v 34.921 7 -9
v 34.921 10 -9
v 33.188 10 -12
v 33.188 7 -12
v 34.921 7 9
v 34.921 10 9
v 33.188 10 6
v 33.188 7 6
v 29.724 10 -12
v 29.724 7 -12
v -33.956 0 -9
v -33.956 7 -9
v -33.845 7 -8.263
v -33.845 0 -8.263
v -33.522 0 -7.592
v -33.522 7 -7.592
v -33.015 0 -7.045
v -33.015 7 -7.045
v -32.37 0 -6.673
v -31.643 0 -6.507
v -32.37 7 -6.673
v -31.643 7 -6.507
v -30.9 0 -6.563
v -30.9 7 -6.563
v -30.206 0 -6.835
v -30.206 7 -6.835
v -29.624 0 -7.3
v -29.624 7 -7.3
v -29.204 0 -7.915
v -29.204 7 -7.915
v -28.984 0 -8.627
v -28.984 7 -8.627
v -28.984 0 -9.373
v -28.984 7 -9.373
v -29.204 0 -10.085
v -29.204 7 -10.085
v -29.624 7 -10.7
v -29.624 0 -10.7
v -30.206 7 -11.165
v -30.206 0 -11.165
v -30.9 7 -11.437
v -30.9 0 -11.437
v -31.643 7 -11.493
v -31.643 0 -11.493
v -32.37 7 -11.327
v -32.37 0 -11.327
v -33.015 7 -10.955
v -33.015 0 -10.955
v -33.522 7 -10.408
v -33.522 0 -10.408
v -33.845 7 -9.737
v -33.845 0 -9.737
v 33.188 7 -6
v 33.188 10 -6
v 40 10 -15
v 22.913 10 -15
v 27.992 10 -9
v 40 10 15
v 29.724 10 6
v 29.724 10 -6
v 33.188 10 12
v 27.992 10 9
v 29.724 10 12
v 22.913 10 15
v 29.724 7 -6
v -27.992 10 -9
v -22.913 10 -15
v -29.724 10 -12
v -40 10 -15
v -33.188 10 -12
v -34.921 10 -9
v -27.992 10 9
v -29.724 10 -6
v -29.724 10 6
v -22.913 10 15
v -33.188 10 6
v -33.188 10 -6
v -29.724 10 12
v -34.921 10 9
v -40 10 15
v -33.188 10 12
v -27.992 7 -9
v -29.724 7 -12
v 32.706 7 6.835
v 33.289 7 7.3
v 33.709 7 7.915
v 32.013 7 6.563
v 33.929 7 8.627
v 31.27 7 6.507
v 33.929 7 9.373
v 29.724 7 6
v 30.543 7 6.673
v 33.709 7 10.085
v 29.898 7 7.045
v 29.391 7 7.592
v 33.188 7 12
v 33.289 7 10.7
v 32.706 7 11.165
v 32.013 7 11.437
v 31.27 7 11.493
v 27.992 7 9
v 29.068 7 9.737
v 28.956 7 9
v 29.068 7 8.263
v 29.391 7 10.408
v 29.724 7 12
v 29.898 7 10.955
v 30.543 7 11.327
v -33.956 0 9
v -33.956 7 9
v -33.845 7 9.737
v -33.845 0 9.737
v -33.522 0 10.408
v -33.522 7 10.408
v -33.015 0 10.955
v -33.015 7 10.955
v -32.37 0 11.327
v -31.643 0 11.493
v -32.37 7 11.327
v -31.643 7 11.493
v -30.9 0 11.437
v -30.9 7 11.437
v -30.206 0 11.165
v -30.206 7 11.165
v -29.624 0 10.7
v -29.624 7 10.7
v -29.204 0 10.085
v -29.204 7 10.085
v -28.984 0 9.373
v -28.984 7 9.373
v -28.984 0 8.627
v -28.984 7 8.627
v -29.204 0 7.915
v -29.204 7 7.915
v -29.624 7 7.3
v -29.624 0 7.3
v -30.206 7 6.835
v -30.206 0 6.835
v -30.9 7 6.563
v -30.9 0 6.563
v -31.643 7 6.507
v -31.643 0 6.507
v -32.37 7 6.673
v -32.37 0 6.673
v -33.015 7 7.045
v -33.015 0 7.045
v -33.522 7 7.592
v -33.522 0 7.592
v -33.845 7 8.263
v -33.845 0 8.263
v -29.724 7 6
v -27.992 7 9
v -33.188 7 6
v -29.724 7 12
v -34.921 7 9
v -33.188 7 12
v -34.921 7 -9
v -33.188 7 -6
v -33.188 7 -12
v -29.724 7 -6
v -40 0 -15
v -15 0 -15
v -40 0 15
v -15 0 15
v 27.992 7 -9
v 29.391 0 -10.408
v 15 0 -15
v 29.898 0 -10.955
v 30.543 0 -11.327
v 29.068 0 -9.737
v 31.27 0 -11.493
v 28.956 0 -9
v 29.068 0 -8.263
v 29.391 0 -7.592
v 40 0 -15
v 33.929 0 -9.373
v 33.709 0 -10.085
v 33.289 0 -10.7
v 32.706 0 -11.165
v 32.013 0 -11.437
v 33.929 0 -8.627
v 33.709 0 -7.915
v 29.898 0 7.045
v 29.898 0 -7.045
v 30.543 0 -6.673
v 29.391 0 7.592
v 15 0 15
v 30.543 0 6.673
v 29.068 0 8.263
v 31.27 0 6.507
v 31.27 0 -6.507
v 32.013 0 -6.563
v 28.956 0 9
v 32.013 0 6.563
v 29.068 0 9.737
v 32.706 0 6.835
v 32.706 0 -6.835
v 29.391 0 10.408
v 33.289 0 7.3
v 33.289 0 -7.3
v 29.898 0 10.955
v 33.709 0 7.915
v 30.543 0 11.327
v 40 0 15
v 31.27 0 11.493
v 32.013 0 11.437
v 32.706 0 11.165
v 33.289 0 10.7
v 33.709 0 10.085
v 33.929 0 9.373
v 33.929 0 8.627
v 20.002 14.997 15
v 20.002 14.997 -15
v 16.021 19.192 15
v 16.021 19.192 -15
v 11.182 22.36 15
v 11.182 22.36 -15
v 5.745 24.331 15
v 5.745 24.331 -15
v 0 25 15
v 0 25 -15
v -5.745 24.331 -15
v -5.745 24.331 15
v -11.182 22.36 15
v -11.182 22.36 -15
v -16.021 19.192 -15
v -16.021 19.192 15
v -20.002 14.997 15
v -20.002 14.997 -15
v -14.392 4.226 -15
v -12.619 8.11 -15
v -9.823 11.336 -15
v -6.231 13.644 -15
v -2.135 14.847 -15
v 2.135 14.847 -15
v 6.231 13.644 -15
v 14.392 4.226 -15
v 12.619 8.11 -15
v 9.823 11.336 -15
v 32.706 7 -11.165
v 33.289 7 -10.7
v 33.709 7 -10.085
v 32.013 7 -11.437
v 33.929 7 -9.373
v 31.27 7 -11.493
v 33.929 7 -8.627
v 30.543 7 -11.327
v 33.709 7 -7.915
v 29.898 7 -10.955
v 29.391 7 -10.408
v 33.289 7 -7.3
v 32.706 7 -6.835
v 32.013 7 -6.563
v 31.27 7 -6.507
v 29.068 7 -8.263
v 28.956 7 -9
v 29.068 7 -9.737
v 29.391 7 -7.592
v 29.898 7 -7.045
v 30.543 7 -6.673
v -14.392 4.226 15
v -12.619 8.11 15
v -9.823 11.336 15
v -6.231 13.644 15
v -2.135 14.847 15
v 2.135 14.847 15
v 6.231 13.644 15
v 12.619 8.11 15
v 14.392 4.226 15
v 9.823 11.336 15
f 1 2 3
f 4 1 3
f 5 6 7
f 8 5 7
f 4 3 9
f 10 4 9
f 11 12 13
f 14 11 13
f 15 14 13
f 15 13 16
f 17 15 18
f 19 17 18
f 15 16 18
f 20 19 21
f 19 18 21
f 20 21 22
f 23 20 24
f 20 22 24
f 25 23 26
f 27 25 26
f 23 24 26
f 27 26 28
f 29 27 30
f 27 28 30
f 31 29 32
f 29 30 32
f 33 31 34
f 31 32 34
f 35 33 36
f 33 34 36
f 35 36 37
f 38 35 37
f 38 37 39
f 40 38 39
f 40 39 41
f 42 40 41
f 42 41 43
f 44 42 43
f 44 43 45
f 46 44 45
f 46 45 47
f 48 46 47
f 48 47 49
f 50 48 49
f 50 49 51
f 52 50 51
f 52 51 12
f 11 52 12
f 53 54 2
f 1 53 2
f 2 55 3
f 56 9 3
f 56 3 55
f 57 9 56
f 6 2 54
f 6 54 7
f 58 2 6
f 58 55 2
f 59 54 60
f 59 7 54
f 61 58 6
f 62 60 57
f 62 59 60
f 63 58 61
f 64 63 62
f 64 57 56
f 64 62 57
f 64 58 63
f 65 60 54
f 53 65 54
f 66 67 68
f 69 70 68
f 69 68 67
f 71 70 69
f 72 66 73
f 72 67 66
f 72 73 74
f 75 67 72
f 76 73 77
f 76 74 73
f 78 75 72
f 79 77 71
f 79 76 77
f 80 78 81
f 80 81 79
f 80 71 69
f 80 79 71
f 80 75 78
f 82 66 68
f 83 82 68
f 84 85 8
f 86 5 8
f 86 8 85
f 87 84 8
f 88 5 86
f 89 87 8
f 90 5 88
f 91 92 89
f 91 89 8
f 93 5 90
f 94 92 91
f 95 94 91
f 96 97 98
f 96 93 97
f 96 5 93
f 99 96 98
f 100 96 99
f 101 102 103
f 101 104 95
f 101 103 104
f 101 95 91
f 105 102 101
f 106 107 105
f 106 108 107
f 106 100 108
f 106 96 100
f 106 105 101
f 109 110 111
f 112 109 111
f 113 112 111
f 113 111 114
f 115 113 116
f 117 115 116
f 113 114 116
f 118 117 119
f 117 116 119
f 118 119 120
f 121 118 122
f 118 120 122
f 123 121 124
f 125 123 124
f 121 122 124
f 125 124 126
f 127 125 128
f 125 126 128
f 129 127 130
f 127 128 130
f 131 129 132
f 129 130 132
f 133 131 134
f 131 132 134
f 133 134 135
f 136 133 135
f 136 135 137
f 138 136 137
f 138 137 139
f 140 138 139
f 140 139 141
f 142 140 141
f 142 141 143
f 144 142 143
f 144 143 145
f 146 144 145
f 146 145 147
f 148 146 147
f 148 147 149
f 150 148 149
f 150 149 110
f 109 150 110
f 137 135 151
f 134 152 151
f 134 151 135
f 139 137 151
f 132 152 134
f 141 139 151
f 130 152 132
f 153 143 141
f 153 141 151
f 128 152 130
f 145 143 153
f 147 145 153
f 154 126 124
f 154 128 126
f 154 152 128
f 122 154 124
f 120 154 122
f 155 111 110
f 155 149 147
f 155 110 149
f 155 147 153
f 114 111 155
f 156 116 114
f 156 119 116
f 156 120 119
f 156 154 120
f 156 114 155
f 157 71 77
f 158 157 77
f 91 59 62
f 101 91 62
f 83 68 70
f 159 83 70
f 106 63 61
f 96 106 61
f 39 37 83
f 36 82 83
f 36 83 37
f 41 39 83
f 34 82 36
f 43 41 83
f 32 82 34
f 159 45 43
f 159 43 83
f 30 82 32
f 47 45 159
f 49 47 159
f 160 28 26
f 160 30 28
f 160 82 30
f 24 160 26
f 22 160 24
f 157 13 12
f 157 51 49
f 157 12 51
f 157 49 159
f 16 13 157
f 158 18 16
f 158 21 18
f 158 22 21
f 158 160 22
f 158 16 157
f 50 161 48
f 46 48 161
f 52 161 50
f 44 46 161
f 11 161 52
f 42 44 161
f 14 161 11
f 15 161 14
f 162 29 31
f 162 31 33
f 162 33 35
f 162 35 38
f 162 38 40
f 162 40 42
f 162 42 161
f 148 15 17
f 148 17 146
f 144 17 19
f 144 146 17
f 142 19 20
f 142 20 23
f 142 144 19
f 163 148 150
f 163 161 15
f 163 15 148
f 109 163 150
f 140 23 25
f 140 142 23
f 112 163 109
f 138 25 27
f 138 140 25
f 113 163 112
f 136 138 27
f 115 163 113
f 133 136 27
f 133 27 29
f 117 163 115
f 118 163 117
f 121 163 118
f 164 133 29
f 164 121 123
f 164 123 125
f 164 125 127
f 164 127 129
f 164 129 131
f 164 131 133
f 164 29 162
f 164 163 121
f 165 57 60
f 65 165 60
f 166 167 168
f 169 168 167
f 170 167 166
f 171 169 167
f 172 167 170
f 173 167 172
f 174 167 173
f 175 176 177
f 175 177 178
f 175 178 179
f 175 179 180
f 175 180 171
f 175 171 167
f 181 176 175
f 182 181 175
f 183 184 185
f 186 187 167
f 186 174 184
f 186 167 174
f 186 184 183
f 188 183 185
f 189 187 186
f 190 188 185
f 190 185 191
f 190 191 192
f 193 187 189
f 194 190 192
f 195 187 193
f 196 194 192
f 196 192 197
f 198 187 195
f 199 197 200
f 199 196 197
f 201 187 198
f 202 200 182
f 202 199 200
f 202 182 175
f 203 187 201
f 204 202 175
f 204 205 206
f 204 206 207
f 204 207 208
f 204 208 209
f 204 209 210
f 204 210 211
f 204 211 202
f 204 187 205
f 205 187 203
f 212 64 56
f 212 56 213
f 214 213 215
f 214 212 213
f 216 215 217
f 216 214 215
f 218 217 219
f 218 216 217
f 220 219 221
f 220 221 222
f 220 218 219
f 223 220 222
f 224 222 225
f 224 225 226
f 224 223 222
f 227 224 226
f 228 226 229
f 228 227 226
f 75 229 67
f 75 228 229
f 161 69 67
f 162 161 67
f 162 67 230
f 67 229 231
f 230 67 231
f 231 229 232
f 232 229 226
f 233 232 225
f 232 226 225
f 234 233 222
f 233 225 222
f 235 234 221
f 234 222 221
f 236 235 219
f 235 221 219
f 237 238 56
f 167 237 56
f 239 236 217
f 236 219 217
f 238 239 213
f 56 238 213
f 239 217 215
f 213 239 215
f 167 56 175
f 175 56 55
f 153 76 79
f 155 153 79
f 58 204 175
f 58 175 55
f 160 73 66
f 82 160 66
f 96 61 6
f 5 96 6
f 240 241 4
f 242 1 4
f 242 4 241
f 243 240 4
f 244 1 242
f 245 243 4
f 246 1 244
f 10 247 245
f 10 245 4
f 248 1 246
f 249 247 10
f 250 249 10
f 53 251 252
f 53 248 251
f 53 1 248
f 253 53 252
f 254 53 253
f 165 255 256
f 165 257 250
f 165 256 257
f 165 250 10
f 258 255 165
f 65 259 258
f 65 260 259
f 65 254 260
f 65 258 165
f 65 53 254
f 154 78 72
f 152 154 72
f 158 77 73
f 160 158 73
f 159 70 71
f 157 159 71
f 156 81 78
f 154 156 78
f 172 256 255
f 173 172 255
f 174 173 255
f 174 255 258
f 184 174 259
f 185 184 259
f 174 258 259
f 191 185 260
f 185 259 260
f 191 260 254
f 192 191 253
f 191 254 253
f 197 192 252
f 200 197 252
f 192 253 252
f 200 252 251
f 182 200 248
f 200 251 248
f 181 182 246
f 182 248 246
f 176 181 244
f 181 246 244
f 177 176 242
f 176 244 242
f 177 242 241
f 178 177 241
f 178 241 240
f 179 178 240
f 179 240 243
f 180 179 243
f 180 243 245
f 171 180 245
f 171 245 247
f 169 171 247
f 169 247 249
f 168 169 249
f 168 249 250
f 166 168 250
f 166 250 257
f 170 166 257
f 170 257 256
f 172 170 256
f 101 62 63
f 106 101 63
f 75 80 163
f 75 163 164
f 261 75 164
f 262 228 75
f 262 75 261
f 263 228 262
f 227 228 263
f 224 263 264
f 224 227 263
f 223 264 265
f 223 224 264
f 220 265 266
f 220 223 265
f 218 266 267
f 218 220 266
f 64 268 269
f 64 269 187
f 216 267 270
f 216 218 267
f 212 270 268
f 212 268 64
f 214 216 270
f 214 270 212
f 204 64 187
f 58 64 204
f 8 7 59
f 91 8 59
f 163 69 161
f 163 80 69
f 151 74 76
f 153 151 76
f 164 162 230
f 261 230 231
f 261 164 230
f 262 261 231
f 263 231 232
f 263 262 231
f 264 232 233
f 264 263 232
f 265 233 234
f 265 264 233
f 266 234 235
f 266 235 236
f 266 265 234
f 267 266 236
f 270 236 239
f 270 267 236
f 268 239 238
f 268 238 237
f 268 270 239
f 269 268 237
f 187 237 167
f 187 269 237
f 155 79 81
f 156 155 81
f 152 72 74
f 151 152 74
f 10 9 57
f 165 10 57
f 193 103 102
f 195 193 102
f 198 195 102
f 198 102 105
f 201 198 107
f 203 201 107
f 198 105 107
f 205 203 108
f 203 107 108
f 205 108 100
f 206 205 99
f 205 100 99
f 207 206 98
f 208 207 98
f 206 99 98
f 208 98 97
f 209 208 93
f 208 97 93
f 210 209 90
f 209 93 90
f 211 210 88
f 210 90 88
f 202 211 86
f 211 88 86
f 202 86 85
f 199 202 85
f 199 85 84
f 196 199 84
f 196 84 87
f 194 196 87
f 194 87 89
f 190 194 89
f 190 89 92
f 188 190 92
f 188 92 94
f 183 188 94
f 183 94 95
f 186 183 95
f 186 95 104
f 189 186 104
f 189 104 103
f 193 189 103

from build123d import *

# Parameters (mm, degrees)
F1_DEPTH = 15
F2_R     = 2.5
F3_DEPTH = 15
F5_DEPTH = 3


with BuildPart() as f1:
    # F0 (on Top) → F1 (new body, symmetric)
    with BuildSketch(Plane.XY):
        with BuildLine():
            ThreePointArc((-15, 0), (0, 15), (15, 0))
            Line((15, 0), (40, 0))
            Line((40, 0), (40, 10))
            Line((40, 10), (22.912878, 10))
            ThreePointArc((22.912878, 10), (0, 25), (-22.912878, 10))
            Line((-22.912878, 10), (-40, 10))
            Line((-40, 10), (-40, 0))
            Line((-40, 0), (-15, 0))
        make_face()
    extrude(amount=F1_DEPTH, both=True)

    # F2 (on face) → F3 (cut)
    with BuildSketch(Plane(origin=(0, 10, 0), x_dir=(-1, 0, 0), z_dir=(0, 1, 0))):
        with Locations((-31.456439, 9)):
            Circle(F2_R)
        with Locations((-31.456439, -9)):
            Circle(F2_R)
        with Locations((31.456439, -9)):
            Circle(F2_R)
        with Locations((31.456439, 9)):
            Circle(F2_R)
    extrude(amount=-F3_DEPTH, mode=Mode.SUBTRACT)

    # F4 (on face) → F5 (cut)
    with BuildSketch(Plane(origin=(0, 10, 0), x_dir=(-1, 0, 0), z_dir=(0, 1, 0))):
        Polygon((29.724388, 6), (33.18849, 6), (34.920541, 9), (33.18849, 12), (29.724388, 12), (27.992338, 9), align=None)
        Polygon((27.992338, -9), (29.724388, -12), (33.18849, -12), (34.920541, -9), (33.18849, -6), (29.724388, -6), align=None)
        Polygon((-33.18849, -6), (-34.920541, -9), (-33.18849, -12), (-29.724388, -12), (-27.992338, -9), (-29.724388, -6), align=None)
        Polygon((-34.920541, 9), (-33.18849, 6), (-29.724388, 6), (-27.992338, 9), (-29.724388, 12), (-33.18849, 12), align=None)
    extrude(amount=-F5_DEPTH, mode=Mode.SUBTRACT)


solid = f1.part
